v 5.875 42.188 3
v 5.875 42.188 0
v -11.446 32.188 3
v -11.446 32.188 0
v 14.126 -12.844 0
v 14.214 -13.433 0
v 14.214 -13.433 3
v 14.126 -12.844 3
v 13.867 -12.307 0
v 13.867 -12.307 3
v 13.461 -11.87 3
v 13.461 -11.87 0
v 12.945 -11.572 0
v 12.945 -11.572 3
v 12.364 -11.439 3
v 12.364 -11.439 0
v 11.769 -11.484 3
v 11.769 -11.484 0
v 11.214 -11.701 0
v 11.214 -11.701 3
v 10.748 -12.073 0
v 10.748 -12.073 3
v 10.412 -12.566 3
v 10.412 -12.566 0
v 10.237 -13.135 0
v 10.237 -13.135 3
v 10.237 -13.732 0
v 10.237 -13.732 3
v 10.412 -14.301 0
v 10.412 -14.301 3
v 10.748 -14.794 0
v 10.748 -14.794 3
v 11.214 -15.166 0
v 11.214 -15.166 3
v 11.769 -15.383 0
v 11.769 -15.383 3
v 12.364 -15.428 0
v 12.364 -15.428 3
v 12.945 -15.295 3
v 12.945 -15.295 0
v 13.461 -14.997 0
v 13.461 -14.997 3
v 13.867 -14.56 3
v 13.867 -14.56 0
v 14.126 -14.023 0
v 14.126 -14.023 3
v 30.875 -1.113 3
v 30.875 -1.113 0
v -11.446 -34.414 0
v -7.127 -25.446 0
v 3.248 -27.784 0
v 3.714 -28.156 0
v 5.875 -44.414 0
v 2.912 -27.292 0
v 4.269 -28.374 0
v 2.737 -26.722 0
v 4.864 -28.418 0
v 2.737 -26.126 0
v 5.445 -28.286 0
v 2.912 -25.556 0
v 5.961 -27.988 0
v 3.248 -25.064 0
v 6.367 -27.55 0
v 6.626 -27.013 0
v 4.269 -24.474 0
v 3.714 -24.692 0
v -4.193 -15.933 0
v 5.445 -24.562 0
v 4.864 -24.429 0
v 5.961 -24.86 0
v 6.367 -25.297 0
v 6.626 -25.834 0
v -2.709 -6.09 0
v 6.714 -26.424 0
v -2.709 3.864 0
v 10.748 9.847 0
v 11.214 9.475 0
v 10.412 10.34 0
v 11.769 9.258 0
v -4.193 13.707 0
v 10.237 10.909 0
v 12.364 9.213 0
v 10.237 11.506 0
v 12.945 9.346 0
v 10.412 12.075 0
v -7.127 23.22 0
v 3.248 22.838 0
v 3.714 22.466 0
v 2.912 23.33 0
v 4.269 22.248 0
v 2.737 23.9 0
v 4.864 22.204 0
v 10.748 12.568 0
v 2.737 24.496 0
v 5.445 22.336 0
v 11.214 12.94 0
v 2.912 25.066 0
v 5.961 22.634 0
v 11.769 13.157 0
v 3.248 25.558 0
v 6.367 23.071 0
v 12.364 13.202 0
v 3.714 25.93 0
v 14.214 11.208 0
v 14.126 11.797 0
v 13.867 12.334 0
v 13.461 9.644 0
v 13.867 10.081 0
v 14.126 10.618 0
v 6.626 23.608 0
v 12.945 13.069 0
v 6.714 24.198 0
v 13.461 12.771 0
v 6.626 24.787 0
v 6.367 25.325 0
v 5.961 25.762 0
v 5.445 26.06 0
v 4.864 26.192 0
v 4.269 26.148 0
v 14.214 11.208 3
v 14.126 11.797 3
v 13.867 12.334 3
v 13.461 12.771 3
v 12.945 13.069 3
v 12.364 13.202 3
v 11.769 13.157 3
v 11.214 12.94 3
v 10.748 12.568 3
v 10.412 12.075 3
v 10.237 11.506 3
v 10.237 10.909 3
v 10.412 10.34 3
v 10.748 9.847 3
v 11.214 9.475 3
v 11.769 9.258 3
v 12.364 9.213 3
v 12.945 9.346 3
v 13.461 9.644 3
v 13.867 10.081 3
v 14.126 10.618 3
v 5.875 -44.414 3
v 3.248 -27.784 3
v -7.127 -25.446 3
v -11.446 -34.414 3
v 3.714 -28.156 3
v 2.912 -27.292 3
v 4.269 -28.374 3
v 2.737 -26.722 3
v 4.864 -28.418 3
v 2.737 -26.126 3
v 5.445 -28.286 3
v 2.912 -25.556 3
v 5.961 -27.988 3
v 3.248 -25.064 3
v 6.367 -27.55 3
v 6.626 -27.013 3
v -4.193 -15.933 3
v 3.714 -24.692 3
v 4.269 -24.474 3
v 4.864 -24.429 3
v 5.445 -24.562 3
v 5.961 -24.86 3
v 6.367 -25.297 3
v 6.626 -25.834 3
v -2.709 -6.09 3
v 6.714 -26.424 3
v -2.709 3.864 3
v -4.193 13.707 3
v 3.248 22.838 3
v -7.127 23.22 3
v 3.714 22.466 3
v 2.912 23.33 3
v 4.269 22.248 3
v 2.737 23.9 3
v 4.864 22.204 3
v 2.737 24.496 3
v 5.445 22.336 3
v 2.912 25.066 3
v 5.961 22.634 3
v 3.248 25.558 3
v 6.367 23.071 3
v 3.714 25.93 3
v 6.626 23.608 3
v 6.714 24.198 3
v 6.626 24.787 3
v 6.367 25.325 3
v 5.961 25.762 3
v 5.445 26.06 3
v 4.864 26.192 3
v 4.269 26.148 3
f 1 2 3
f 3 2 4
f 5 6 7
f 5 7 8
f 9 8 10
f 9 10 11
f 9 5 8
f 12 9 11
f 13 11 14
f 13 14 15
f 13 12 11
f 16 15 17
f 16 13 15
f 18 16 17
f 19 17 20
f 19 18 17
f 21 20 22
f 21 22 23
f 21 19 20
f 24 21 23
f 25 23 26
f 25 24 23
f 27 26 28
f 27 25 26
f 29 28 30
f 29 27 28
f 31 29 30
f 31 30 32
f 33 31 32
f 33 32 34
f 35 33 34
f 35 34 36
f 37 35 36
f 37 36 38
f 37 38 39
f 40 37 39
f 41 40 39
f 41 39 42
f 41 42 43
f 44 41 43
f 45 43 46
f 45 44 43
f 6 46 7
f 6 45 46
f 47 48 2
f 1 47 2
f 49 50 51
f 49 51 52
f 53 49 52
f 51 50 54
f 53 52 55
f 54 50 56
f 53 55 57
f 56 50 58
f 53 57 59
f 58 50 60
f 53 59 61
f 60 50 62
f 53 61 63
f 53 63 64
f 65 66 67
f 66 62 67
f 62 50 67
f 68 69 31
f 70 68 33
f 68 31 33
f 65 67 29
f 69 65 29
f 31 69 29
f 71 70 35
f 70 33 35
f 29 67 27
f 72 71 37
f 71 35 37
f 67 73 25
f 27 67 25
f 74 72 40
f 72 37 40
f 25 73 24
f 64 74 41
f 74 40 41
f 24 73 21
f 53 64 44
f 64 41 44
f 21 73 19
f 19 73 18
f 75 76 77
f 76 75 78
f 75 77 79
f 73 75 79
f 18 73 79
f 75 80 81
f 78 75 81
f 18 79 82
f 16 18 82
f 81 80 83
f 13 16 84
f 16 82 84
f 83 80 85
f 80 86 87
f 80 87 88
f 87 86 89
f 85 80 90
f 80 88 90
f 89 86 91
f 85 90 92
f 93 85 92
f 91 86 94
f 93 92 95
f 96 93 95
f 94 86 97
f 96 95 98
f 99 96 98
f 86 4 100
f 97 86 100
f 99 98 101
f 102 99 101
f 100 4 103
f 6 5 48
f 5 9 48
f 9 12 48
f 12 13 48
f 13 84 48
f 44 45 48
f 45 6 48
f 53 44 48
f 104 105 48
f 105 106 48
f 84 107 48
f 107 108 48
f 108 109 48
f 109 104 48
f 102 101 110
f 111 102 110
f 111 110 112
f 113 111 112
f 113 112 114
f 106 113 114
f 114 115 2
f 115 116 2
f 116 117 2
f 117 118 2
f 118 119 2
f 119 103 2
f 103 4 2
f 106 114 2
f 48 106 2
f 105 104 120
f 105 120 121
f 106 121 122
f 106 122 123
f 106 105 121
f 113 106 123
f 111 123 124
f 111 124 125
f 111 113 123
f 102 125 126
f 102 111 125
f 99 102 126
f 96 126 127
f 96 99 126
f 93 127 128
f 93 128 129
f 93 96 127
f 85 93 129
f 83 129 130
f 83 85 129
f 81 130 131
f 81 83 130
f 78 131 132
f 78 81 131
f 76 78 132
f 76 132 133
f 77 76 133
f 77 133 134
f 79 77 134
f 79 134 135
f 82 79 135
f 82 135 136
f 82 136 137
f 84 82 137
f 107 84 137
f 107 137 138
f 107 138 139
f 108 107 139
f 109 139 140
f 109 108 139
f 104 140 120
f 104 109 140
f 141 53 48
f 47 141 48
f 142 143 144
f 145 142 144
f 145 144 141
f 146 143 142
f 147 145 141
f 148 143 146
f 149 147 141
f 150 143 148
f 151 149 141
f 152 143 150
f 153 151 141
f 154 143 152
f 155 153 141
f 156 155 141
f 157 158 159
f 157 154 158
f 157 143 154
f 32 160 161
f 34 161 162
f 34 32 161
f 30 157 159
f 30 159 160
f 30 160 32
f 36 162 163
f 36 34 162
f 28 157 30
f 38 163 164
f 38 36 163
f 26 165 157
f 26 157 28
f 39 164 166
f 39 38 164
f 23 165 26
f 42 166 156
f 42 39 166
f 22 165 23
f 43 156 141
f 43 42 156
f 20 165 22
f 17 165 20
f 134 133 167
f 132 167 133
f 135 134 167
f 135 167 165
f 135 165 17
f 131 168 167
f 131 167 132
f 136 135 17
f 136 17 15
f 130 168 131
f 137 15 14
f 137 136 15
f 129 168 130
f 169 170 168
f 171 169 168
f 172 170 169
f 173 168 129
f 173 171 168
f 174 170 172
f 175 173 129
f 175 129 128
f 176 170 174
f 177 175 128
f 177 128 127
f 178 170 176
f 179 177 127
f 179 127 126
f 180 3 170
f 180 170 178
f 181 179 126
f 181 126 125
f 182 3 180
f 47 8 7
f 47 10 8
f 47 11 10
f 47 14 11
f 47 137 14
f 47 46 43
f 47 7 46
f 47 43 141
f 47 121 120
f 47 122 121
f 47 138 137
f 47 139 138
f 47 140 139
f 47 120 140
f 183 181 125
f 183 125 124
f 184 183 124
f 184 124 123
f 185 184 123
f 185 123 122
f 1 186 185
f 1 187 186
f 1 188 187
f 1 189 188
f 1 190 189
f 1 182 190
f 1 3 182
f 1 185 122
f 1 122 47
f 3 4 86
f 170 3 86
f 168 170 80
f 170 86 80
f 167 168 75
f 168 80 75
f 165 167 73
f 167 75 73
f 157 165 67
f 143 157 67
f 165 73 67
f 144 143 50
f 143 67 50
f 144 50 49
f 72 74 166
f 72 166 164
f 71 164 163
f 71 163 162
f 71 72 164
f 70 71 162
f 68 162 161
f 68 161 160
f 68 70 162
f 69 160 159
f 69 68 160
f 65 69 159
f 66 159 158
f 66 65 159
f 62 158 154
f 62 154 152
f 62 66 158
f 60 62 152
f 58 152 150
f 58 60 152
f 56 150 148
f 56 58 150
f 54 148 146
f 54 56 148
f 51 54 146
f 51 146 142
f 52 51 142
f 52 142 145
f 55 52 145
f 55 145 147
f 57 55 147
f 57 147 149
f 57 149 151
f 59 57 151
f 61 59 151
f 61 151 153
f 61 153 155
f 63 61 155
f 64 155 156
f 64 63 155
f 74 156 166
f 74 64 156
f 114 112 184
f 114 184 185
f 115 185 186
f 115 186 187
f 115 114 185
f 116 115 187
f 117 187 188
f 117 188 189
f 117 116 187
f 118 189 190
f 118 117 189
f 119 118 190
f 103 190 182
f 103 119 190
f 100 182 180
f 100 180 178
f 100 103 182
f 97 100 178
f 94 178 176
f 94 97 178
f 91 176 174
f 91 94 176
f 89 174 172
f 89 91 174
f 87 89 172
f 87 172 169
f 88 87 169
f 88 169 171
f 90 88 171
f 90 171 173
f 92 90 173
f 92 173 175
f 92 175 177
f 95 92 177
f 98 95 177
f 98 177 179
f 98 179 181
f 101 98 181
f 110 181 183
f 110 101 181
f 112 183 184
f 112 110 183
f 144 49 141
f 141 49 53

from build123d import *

# Parameters (mm, degrees)
SKETCH_1_R      = 2
EXTRUDE_1_DEPTH = 3


with BuildPart() as part:
    # 草图1 → 凸台-拉伸1 (new body)
    with BuildSketch(Plane.XY):
        with BuildLine():
            Line((30.874609077, -1.112961222), (5.874609077, 42.188308967))
            Line((5.874609077, 42.188308967), (-11.445898998, 32.188308967))
            ThreePointArc((-11.445898998, 32.188308967), (-2.522850544, -1.112961222), (-11.445898998, -34.414231411))
            Line((-11.445898998, -34.414231411), (5.874609077, -44.414231411))
            Line((5.874609077, -44.414231411), (30.874609077, -1.112961222))
        make_face()
        with Locations((4.714355039, -26.423850355)):
            Circle(SKETCH_1_R, mode=Mode.SUBTRACT)
        with Locations((12.214355039, -13.433469298)):
            Circle(SKETCH_1_R, mode=Mode.SUBTRACT)
        with Locations((12.214355039, 11.207546854)):
            Circle(SKETCH_1_R, mode=Mode.SUBTRACT)
        with Locations((4.714355039, 24.19792791)):
            Circle(SKETCH_1_R, mode=Mode.SUBTRACT)
    extrude(amount=EXTRUDE_1_DEPTH)


solid = part.part
